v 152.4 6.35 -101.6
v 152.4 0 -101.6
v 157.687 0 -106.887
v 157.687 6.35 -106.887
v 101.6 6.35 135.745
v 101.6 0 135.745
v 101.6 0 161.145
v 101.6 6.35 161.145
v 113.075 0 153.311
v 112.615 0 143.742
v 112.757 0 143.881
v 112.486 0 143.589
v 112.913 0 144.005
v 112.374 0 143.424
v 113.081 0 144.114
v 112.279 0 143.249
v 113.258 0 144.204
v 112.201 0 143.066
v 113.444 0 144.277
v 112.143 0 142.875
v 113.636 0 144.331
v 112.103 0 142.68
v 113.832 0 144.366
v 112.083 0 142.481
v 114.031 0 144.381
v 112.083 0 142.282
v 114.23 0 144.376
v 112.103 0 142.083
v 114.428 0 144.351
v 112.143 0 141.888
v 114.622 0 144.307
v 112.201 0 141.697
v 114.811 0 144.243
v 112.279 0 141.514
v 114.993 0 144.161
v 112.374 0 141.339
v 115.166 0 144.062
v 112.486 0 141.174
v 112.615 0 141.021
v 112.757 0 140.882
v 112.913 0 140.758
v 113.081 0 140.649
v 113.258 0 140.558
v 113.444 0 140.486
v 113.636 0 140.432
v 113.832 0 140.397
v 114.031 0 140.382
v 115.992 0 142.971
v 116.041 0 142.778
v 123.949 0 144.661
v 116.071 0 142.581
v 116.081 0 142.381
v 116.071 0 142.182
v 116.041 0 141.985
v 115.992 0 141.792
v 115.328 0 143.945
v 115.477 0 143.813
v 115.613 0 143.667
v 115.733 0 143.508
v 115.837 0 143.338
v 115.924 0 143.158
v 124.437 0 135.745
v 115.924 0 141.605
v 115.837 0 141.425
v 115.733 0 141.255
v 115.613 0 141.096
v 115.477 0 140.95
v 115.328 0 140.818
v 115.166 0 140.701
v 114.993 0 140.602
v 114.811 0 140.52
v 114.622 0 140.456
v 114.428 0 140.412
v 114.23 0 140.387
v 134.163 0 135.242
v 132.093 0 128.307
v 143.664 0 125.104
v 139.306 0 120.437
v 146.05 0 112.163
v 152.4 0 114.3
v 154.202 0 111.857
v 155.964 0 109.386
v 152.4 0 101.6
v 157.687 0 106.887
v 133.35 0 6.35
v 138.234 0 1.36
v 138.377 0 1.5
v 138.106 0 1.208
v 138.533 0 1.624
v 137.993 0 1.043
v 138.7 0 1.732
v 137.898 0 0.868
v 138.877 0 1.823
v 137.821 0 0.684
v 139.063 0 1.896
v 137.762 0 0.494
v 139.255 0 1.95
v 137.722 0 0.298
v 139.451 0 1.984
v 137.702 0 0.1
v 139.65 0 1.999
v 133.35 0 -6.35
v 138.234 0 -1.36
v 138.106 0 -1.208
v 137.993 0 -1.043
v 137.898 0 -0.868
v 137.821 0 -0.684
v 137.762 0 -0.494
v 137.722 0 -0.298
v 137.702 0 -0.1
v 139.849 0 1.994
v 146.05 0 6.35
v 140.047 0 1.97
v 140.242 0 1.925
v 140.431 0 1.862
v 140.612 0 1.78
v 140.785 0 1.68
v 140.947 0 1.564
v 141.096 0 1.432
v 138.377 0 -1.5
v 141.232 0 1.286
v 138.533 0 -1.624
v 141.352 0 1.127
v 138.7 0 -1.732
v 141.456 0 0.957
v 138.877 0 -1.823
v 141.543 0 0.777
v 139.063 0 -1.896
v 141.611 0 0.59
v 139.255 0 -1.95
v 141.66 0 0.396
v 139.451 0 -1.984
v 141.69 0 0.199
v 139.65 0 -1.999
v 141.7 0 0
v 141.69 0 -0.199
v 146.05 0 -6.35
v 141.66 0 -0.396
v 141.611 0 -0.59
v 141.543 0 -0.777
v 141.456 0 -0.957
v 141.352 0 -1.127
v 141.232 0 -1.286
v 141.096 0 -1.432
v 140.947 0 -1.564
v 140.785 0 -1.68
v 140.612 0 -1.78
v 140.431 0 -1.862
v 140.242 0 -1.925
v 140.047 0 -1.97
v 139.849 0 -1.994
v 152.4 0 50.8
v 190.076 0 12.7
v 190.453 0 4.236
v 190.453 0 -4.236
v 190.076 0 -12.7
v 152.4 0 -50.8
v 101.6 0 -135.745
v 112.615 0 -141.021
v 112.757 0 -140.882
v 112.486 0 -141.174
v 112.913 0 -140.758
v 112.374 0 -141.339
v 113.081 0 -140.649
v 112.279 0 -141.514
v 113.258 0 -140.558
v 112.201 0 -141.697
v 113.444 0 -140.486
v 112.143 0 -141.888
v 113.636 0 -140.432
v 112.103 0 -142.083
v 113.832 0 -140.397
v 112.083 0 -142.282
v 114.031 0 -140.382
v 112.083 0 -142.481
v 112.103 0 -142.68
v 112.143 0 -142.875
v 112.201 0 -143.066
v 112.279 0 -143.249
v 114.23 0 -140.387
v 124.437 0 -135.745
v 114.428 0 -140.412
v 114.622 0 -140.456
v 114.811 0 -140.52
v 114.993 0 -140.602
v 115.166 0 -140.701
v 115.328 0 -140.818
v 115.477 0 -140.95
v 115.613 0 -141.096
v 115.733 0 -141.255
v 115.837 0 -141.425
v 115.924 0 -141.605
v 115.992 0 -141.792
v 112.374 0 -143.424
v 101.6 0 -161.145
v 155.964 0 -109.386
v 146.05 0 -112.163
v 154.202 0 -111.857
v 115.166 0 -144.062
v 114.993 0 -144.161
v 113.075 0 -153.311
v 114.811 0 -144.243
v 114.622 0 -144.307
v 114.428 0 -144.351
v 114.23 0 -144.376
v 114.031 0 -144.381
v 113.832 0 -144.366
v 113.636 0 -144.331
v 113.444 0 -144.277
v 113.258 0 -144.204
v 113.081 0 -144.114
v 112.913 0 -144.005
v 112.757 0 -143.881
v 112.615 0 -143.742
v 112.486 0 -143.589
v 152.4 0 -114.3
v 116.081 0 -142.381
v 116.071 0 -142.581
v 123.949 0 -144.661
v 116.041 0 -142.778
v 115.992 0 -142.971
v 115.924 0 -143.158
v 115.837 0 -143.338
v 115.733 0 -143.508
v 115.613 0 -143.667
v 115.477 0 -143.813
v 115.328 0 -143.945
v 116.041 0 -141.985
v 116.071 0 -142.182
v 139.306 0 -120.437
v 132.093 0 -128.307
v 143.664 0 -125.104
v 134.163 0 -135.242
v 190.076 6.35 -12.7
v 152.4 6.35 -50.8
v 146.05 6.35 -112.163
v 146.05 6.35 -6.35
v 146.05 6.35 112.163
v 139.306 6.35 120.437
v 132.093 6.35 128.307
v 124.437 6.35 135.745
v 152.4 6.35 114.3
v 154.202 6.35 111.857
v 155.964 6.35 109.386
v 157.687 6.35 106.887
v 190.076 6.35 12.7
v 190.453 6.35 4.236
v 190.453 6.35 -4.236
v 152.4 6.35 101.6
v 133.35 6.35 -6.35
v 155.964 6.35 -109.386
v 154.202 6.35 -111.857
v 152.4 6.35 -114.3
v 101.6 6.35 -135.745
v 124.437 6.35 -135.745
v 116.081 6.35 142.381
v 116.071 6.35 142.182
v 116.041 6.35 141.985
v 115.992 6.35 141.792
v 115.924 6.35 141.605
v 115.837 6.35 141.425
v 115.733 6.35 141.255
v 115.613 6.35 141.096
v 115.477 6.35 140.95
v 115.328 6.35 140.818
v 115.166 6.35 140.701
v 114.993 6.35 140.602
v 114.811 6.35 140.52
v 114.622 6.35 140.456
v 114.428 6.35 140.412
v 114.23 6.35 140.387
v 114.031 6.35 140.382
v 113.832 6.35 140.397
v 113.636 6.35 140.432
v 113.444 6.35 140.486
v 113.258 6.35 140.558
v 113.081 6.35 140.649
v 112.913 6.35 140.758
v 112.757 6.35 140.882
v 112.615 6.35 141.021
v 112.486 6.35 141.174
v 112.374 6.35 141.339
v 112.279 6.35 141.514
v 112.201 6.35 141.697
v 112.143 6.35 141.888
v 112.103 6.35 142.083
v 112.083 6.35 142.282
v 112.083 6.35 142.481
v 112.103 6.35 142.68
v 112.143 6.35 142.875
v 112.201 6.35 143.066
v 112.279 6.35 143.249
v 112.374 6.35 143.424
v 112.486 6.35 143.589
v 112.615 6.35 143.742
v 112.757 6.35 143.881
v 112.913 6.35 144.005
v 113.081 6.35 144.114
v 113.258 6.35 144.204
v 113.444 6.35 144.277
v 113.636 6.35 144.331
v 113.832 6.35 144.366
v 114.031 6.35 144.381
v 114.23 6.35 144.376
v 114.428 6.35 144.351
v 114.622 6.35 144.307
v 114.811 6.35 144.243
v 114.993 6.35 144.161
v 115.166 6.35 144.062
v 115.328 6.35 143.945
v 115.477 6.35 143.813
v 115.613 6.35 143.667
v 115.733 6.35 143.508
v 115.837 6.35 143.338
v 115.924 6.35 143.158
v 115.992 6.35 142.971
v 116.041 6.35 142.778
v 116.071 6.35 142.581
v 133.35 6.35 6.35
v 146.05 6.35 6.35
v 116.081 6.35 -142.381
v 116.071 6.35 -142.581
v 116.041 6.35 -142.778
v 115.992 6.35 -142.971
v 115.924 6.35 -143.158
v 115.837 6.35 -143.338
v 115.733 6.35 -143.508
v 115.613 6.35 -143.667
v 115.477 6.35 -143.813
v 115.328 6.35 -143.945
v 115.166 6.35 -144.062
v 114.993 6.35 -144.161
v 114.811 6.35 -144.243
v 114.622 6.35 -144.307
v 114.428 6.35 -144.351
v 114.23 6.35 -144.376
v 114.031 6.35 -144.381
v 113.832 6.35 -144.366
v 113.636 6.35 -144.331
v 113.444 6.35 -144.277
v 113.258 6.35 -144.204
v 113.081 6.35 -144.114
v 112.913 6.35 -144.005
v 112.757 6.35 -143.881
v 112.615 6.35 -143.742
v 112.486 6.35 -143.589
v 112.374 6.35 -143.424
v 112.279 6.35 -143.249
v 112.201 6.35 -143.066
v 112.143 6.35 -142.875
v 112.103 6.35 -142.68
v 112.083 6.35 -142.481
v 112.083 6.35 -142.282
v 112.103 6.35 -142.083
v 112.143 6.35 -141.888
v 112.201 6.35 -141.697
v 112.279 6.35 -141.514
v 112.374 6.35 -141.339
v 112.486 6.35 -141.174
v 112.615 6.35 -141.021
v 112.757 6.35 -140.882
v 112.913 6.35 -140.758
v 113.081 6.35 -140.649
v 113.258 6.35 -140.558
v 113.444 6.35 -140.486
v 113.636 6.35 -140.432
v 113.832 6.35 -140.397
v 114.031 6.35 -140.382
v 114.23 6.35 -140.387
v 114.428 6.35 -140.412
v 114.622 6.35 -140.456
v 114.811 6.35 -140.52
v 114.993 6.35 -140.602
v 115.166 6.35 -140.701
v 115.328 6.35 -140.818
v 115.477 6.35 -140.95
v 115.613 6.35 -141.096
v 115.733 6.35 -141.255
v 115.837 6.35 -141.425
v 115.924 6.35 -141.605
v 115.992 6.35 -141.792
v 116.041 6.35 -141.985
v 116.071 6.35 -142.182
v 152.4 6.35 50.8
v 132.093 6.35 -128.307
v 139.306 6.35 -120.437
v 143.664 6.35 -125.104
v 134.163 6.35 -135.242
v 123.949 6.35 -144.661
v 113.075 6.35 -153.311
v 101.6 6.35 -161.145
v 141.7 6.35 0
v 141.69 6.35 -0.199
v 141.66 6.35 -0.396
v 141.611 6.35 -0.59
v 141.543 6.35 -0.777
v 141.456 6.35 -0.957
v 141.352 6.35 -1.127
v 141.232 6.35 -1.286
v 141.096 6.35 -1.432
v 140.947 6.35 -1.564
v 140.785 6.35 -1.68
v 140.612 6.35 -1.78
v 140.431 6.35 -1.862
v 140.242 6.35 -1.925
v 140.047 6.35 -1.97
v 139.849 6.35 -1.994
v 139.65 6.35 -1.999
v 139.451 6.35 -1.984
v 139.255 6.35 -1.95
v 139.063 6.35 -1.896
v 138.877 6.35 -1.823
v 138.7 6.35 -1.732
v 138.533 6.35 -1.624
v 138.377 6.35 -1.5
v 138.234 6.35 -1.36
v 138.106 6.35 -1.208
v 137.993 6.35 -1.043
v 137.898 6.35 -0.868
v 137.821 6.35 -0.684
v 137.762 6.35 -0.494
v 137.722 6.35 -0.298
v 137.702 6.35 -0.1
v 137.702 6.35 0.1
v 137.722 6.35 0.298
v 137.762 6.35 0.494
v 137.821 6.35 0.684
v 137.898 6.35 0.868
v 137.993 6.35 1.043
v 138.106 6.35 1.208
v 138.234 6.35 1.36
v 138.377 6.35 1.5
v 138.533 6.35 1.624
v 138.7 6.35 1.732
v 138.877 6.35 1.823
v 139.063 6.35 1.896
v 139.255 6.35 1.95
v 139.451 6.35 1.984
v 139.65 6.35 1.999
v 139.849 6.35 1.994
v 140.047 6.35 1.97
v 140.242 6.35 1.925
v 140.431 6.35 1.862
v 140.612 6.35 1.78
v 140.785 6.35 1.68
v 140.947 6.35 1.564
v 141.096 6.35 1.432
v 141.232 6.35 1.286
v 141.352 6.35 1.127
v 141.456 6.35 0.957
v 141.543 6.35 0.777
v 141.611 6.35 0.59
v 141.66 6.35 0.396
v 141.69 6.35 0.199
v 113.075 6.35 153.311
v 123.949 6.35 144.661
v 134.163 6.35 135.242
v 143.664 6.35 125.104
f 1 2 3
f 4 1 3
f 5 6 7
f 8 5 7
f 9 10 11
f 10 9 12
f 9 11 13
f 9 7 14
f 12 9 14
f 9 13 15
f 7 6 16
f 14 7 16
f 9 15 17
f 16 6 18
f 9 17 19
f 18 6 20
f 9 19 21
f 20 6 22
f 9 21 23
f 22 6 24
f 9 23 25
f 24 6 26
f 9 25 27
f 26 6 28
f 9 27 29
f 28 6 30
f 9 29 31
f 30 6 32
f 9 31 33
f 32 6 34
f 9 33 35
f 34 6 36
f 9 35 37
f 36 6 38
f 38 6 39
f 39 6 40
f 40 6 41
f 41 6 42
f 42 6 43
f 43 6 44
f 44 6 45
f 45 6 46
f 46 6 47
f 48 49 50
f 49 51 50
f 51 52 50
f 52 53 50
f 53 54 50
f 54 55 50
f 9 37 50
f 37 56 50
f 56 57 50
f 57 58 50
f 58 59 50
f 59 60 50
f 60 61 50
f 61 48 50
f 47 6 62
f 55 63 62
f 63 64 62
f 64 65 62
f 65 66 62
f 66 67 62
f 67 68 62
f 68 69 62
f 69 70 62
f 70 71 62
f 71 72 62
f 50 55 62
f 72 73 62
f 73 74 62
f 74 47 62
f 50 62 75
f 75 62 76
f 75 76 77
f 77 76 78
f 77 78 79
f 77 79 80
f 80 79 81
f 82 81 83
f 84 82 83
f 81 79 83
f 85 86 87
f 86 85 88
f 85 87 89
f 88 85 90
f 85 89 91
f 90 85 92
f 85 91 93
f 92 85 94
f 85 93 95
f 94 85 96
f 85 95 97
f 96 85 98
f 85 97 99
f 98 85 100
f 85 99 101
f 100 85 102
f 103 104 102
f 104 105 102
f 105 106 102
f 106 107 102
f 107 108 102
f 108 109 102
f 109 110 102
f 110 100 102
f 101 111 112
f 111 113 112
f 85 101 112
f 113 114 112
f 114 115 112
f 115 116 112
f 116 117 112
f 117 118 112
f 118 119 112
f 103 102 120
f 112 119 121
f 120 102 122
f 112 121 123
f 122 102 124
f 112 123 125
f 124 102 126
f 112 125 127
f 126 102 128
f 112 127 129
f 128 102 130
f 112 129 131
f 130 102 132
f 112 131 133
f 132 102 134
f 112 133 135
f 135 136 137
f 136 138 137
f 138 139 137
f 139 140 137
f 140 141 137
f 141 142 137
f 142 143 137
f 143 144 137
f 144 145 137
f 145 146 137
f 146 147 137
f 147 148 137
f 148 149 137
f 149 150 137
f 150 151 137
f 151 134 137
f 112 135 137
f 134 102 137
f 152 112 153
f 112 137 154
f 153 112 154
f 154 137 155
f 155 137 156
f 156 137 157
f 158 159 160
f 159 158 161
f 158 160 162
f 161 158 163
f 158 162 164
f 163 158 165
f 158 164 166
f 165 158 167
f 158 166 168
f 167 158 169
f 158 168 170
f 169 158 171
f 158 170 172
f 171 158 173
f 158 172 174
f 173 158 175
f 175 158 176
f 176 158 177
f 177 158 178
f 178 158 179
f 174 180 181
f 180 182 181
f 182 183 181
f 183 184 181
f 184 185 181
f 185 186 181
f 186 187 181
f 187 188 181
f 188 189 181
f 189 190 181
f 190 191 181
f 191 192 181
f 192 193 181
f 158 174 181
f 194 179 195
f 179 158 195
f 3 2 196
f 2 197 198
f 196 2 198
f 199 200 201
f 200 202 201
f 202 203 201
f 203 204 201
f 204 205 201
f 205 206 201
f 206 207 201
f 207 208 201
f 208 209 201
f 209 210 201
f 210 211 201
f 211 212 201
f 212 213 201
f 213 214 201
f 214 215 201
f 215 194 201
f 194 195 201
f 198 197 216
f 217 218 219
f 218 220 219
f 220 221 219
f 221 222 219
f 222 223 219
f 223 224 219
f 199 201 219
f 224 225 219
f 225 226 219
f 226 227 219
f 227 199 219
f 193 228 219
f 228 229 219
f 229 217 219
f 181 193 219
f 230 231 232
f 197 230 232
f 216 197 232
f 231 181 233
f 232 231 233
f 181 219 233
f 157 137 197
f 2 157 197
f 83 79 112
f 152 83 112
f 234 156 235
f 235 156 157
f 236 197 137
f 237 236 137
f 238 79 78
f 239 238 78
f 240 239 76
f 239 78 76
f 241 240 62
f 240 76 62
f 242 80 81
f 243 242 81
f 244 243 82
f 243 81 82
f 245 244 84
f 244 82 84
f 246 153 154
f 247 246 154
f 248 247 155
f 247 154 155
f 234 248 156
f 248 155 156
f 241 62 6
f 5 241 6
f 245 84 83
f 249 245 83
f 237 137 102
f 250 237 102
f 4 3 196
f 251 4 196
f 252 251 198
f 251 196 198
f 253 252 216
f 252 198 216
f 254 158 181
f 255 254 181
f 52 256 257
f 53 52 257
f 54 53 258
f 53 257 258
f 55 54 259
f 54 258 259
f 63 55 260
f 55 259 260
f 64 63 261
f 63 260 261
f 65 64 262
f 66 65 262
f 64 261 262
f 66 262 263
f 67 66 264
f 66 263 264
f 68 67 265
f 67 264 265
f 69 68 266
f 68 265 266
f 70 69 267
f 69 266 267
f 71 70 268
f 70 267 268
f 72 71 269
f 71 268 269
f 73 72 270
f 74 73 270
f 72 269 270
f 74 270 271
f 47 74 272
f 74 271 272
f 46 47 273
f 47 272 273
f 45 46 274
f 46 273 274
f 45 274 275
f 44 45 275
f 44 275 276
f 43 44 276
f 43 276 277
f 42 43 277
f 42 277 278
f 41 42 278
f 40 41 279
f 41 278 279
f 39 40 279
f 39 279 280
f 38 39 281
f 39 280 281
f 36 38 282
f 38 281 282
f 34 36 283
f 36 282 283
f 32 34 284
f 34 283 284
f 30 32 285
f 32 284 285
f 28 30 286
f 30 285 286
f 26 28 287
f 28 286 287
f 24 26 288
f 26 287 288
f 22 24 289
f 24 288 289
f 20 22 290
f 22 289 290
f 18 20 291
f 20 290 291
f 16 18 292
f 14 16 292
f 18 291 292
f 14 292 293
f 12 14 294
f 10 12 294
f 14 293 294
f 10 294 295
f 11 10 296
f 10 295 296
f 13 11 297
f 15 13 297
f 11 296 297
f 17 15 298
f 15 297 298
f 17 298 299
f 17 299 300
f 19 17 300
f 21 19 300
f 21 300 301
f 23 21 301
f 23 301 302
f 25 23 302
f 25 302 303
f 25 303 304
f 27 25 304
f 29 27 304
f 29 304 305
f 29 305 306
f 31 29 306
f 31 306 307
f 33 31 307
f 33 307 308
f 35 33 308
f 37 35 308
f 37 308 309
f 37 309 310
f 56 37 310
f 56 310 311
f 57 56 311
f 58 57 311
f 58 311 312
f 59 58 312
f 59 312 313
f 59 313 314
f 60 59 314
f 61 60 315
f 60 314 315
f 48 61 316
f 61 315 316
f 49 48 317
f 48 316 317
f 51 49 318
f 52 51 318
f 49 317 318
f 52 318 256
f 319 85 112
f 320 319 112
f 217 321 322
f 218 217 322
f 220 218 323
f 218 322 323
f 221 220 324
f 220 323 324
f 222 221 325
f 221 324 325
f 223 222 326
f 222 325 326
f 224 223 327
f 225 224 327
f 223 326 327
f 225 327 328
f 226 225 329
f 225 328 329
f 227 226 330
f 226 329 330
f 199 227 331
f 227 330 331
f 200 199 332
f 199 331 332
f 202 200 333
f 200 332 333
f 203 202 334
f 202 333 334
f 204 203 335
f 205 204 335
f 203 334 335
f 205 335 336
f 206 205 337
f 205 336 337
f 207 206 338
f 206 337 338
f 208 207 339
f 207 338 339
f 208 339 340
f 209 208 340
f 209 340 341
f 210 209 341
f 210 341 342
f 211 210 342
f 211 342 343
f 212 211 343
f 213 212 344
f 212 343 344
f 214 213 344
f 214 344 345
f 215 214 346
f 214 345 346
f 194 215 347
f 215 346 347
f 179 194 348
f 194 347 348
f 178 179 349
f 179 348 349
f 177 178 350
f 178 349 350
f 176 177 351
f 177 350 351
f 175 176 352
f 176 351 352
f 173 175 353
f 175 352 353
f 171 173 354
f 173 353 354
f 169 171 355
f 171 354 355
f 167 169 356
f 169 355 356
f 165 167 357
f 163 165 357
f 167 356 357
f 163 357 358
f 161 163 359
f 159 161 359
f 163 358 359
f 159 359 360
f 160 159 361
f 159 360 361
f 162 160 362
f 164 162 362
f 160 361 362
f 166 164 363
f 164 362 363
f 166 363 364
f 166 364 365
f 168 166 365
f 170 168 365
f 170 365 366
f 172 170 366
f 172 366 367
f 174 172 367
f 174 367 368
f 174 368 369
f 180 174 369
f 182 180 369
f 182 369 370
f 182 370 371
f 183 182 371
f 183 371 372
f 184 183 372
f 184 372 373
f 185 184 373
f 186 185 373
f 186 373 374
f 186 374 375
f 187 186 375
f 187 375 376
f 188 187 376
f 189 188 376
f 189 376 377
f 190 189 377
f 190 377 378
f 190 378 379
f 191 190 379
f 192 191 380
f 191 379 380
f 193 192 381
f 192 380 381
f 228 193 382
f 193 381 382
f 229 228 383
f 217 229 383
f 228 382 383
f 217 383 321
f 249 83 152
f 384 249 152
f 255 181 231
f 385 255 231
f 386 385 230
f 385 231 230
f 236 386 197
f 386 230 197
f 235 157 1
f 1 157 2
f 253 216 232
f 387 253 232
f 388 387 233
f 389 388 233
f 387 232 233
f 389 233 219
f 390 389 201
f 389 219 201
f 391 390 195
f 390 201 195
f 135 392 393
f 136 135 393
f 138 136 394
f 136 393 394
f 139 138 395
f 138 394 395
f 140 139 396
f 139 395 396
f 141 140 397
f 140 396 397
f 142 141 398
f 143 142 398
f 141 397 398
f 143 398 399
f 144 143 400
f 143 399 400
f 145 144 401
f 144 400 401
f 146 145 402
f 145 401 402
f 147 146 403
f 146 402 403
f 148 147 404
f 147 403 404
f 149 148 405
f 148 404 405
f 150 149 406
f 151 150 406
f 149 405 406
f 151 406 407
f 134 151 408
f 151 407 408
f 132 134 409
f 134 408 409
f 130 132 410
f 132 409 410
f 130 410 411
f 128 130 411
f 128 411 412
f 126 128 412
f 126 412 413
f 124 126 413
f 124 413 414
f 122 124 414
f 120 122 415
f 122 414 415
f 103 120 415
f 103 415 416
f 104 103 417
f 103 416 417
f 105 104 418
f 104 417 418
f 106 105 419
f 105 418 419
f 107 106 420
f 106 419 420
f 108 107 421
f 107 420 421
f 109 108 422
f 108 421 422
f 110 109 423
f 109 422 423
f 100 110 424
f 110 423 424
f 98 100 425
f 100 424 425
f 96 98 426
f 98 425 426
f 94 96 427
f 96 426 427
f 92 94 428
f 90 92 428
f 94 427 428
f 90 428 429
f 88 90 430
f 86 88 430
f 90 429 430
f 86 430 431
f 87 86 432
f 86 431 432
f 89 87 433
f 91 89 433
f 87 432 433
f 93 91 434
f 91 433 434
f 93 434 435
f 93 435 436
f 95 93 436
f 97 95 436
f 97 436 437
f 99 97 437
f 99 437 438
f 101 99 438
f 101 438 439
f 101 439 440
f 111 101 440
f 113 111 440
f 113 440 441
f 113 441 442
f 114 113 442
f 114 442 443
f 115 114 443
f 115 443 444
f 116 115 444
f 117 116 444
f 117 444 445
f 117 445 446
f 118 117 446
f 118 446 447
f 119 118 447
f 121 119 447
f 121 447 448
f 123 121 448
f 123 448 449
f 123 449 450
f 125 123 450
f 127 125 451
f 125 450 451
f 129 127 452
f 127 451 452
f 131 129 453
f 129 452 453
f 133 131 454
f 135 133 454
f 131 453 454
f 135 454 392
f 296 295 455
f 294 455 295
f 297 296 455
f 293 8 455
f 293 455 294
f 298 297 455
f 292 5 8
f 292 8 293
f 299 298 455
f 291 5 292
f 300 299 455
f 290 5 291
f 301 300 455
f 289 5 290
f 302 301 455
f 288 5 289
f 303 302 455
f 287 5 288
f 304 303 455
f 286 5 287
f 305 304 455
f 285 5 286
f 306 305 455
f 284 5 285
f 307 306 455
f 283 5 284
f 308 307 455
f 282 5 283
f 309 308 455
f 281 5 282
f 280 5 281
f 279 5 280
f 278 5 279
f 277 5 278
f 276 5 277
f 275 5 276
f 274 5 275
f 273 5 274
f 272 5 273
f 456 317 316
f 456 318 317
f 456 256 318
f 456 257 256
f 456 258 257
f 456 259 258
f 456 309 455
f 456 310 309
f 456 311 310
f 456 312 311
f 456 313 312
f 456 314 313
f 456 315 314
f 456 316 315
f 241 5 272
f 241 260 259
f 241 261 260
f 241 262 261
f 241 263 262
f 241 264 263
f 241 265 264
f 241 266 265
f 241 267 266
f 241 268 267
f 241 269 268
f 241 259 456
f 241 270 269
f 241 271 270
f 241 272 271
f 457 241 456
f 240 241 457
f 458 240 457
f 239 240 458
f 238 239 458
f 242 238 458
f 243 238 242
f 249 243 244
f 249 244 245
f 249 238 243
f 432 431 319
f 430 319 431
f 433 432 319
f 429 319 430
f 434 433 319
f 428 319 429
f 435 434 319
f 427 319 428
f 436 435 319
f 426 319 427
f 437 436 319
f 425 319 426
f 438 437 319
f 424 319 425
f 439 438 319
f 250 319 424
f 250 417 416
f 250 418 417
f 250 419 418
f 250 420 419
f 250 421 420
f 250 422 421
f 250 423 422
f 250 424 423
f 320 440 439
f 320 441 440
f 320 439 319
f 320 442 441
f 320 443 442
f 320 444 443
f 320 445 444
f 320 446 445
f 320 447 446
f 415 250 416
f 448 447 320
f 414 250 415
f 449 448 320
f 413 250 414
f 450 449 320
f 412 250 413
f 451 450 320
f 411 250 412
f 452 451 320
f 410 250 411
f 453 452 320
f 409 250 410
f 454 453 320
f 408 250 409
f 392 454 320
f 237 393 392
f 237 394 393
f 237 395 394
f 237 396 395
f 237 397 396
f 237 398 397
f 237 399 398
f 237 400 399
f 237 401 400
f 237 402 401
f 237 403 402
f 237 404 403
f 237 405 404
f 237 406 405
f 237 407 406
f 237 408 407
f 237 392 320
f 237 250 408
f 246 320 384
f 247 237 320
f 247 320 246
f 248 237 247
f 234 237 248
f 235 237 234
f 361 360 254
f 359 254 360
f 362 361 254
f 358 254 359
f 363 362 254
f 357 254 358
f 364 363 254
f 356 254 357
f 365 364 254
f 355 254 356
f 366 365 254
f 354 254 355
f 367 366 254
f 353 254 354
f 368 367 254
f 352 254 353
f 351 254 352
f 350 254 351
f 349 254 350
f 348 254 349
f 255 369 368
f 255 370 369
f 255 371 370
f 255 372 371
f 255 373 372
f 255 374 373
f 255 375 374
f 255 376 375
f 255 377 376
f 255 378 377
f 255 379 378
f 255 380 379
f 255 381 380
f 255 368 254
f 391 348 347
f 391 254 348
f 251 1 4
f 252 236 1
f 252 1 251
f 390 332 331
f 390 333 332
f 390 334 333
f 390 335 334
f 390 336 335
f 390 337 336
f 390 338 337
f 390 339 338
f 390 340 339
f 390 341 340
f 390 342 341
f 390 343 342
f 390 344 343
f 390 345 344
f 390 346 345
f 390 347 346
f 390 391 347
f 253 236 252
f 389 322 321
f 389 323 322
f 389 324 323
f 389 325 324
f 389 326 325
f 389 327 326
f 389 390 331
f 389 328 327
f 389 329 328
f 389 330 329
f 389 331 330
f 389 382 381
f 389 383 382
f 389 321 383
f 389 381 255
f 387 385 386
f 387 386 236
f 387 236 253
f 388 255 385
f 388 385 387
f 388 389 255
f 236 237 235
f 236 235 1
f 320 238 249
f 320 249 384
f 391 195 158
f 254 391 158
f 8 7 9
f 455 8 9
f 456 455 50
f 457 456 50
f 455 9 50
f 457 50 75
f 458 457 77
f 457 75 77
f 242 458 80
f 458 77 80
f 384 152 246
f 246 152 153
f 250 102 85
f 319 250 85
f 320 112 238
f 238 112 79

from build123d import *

# Parameters (mm, degrees)
BOSS_EXTRUDE2_DEPTH = 6.35
SKETCH40_R          = 2
CUT_EXTRUDE1_DEPTH  = 6.35
SKETCH41_R          = 2
CUT_EXTRUDE2_DEPTH  = 6.35


with BuildPart() as part:
    # Sketch1 → Boss-Extrude2 (new body)
    with BuildSketch(Plane(origin=(0, 0, 0), x_dir=(1, 0, 0), z_dir=(0, 1, 0))):
        with BuildLine():
            Line((152.4, -101.6), (152.4, -50.8))
            Line((152.4, -50.8), (190.076195248, -12.7))
            ThreePointArc((190.076195248, -12.7), (190.5, 0), (190.076195248, 12.7))
            Line((190.076195248, 12.7), (152.4, 50.8))
            Line((152.4, 50.8), (152.4, 101.6))
            Line((152.4, 101.6), (157.687433266, 106.887433266))
            ThreePointArc((157.687433266, 106.887433266), (155.08800922, 110.62531083), (152.4, 114.3))
            ThreePointArc((152.4, 114.3), (129.141828926, 140.045128518), (101.6, 161.144934764))
            Line((101.6, 161.144934764), (101.6, 135.744934764))
            Line((101.6, 135.744934764), (124.436872293, 135.744934764))
            ThreePointArc((124.436872293, 135.744934764), (135.756435031, 124.424325787), (146.05, 112.163363002))
            Line((146.05, 112.163363002), (146.05, 6.35))
            Line((146.05, 6.35), (133.35, 6.35))
            Line((133.35, 6.35), (133.35, -6.35))
            Line((133.35, -6.35), (146.05, -6.35))
            Line((146.05, -6.35), (146.05, -112.163363002))
            ThreePointArc((146.05, -112.163363002), (135.756435031, -124.424325787), (124.436872293, -135.744934764))
            Line((124.436872293, -135.744934764), (101.6, -135.744934764))
            Line((101.6, -135.744934764), (101.6, -161.144934764))
            ThreePointArc((101.6, -161.144934764), (129.141828926, -140.045128518), (152.4, -114.3))
            ThreePointArc((152.4, -114.3), (155.08800922, -110.62531083), (157.687433266, -106.887433266))
            Line((157.687433266, -106.887433266), (152.4, -101.6))
        make_face()
    extrude(amount=BOSS_EXTRUDE2_DEPTH)

    # Sketch40 → Cut-Extrude1 (cut)
    with BuildSketch(Plane(origin=(0, 6.35, 0), x_dir=(1, 0, 0), z_dir=(0, 1, 0))):
        with Locations((139.7, 0)):
            Circle(SKETCH40_R)
    extrude(amount=-CUT_EXTRUDE1_DEPTH, mode=Mode.SUBTRACT)

    # Sketch41 → Cut-Extrude2 (cut)
    with BuildSketch(Plane(origin=(0, 6.35, 0), x_dir=(1, 0, 0), z_dir=(0, 1, 0))):
        with Locations((114.080655546, 142.381475202)):
            Circle(SKETCH41_R)
        with Locations((114.080655546, -142.381475202)):
            Circle(SKETCH41_R)
    extrude(amount=-CUT_EXTRUDE2_DEPTH, mode=Mode.SUBTRACT)


solid = part.part
